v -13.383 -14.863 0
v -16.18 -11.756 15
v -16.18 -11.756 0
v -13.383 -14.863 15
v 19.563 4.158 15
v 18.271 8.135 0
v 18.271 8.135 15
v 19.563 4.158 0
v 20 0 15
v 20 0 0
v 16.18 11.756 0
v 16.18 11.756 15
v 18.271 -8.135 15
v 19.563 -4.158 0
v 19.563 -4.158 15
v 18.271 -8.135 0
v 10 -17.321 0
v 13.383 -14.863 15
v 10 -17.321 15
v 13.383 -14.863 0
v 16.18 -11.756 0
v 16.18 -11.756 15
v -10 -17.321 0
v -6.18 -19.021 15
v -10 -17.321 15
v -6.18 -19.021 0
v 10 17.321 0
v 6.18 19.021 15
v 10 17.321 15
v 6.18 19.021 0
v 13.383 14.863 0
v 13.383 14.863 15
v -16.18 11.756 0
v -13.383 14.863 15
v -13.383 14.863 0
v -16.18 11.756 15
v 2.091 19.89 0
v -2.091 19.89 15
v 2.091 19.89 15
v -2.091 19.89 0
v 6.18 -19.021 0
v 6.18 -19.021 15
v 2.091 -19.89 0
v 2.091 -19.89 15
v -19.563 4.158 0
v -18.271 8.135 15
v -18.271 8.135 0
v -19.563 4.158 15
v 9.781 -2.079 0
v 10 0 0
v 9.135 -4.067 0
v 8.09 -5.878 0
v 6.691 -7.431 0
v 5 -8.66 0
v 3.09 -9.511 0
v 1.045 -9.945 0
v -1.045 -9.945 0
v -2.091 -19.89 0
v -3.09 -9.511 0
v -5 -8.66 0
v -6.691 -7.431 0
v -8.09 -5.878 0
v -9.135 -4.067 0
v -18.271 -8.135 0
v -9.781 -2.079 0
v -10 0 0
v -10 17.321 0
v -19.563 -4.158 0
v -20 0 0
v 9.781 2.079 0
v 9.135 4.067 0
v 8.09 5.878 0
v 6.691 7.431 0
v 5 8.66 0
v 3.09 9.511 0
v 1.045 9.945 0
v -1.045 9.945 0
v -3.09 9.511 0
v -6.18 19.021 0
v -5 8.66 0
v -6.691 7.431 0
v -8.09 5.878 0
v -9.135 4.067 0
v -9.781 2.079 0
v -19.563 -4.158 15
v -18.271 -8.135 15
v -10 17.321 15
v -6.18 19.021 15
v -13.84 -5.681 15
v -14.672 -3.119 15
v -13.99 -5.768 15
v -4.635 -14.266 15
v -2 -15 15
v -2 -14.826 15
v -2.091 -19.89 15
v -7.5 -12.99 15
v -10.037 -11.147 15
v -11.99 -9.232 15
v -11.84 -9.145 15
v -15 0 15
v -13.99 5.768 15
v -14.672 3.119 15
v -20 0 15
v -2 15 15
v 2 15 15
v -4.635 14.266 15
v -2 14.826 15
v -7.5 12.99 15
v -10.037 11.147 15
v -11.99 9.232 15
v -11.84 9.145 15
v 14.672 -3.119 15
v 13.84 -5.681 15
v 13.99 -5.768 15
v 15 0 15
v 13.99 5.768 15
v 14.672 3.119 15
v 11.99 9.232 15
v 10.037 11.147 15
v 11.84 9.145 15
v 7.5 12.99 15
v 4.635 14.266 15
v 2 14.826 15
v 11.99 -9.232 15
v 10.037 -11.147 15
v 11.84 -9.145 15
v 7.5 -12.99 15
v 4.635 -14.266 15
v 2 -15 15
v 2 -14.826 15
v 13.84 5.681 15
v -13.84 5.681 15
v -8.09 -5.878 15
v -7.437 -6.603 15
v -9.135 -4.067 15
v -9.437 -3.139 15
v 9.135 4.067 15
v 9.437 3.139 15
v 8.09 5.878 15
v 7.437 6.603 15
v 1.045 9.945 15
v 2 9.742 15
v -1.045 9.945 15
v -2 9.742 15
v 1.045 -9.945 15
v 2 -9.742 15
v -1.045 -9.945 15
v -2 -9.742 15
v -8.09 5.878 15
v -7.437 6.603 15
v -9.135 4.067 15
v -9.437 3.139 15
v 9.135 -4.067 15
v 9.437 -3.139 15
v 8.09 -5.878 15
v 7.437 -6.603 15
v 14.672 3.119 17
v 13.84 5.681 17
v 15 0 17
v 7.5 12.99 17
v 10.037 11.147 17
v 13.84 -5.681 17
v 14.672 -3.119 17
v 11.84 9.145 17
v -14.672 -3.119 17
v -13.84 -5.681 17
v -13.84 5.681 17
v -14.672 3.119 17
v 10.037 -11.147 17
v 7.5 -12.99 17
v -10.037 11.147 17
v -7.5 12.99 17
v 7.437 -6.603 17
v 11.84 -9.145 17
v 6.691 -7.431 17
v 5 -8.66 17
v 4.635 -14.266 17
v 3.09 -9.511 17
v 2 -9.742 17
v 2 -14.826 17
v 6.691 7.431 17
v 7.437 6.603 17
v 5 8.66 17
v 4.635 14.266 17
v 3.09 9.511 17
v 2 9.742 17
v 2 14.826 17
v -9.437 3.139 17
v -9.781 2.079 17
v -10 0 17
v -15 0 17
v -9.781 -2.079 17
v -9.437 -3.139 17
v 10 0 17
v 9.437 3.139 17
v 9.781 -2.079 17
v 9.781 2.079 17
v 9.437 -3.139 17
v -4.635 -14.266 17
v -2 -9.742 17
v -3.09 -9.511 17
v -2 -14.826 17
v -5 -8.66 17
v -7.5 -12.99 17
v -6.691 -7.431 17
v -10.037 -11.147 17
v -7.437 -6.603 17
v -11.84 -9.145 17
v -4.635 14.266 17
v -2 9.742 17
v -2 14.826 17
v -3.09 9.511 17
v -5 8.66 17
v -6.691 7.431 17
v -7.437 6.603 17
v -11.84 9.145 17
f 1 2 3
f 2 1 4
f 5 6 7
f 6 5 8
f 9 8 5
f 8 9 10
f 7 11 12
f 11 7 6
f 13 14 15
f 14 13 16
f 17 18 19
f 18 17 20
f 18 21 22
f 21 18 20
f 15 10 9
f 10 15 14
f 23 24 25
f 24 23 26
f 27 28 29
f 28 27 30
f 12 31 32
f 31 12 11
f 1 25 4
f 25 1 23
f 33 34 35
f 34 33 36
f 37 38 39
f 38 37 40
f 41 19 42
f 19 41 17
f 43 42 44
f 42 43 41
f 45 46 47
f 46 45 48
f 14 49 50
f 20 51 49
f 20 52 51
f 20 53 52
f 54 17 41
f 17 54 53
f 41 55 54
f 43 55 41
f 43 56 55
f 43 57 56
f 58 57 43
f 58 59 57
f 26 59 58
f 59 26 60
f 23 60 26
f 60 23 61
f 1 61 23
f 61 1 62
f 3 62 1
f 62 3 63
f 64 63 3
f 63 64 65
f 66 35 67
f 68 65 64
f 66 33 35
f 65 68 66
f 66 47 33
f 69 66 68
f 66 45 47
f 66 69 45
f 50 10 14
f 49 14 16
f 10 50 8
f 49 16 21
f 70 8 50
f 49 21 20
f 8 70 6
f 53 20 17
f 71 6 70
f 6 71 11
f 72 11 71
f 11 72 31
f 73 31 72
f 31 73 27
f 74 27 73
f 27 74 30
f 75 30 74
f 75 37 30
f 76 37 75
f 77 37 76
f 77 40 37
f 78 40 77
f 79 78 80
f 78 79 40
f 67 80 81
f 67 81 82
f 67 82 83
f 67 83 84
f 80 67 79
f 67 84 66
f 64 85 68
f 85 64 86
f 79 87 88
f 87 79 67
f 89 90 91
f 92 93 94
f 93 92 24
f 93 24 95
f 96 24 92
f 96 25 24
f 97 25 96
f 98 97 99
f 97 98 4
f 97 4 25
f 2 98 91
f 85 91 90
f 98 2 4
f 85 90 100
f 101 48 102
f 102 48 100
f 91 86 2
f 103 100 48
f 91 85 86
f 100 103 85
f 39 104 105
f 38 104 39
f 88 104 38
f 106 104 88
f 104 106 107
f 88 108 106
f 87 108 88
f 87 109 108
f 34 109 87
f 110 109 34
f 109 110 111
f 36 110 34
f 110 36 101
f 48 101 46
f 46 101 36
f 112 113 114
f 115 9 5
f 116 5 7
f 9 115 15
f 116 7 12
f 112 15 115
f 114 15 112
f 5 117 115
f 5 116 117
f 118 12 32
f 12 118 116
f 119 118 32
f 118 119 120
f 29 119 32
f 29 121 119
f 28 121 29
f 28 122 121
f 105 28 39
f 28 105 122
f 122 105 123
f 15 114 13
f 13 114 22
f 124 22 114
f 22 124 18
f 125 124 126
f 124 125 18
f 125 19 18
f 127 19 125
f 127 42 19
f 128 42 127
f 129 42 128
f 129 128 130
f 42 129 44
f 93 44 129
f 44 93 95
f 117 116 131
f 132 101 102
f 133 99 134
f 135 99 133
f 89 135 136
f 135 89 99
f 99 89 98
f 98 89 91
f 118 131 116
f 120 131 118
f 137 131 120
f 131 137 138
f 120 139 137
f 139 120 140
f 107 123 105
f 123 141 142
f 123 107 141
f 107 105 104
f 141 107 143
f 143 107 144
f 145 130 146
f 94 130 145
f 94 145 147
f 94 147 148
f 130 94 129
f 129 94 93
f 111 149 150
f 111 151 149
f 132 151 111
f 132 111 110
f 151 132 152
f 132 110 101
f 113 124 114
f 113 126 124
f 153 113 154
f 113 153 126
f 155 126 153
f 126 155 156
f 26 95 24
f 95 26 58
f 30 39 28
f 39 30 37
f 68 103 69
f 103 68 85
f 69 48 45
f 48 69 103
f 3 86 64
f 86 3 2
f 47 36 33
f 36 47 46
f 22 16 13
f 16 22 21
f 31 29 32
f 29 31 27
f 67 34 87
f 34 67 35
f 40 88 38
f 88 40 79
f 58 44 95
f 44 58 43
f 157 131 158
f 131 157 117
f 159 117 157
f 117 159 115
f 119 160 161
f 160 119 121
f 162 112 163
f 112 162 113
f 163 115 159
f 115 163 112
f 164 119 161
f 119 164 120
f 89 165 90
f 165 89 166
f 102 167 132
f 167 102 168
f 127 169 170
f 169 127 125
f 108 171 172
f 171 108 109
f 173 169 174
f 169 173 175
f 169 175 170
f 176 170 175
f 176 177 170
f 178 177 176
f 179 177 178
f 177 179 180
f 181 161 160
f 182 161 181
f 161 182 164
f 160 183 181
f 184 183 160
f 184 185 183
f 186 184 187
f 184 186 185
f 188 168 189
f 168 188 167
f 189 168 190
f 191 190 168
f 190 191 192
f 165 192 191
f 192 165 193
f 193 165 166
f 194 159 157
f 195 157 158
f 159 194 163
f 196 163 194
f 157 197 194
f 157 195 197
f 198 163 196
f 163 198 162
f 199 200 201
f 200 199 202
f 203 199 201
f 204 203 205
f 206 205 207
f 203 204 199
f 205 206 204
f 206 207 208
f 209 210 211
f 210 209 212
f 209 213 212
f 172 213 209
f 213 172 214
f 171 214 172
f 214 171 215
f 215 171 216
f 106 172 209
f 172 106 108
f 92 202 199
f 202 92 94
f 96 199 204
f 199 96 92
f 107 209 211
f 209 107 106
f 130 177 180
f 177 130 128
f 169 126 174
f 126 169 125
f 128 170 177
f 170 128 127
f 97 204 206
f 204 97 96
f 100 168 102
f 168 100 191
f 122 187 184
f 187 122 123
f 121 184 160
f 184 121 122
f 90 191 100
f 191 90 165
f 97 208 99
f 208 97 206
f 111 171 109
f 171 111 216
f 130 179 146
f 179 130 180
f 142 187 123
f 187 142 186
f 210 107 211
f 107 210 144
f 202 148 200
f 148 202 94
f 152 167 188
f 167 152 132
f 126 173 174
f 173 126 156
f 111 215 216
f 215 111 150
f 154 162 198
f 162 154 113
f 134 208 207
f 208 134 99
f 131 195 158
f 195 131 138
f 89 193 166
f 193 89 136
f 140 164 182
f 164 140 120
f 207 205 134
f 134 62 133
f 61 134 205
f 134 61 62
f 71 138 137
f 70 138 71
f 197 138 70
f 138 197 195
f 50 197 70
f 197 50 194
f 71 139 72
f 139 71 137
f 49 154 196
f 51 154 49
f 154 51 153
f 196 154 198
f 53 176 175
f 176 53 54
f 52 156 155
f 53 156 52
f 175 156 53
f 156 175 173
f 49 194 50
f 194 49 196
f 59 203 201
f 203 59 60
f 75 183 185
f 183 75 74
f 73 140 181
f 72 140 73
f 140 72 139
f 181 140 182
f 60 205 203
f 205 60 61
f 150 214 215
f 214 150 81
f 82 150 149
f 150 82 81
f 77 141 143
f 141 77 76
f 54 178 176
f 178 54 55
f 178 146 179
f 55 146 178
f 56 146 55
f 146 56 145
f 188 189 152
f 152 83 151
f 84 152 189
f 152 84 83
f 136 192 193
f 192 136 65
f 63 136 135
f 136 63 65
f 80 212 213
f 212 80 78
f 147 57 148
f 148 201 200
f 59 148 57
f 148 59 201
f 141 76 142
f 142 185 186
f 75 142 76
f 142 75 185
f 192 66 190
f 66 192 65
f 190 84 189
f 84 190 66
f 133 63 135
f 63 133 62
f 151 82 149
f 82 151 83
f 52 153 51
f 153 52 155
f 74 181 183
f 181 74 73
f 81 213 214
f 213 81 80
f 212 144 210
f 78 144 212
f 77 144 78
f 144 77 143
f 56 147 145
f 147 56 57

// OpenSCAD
rim=2;
height=15;
height_rim=height+rim;
diameter_outer=40;
diameter=30;
diameter_inner=20;
spoke=4;

difference() {
    union() {
        cylinder(h=height, d=diameter_outer);
        cylinder(h=height_rim, d=diameter);
    }
    cylinder(h=height_rim+1, d=diameter_inner);
    for (x = [0:2]) {
        rotate(x*180/3) {
            translate([-spoke/2, -diameter/2, height]) cube([spoke, diameter, height_rim]);
        }
    }
}
